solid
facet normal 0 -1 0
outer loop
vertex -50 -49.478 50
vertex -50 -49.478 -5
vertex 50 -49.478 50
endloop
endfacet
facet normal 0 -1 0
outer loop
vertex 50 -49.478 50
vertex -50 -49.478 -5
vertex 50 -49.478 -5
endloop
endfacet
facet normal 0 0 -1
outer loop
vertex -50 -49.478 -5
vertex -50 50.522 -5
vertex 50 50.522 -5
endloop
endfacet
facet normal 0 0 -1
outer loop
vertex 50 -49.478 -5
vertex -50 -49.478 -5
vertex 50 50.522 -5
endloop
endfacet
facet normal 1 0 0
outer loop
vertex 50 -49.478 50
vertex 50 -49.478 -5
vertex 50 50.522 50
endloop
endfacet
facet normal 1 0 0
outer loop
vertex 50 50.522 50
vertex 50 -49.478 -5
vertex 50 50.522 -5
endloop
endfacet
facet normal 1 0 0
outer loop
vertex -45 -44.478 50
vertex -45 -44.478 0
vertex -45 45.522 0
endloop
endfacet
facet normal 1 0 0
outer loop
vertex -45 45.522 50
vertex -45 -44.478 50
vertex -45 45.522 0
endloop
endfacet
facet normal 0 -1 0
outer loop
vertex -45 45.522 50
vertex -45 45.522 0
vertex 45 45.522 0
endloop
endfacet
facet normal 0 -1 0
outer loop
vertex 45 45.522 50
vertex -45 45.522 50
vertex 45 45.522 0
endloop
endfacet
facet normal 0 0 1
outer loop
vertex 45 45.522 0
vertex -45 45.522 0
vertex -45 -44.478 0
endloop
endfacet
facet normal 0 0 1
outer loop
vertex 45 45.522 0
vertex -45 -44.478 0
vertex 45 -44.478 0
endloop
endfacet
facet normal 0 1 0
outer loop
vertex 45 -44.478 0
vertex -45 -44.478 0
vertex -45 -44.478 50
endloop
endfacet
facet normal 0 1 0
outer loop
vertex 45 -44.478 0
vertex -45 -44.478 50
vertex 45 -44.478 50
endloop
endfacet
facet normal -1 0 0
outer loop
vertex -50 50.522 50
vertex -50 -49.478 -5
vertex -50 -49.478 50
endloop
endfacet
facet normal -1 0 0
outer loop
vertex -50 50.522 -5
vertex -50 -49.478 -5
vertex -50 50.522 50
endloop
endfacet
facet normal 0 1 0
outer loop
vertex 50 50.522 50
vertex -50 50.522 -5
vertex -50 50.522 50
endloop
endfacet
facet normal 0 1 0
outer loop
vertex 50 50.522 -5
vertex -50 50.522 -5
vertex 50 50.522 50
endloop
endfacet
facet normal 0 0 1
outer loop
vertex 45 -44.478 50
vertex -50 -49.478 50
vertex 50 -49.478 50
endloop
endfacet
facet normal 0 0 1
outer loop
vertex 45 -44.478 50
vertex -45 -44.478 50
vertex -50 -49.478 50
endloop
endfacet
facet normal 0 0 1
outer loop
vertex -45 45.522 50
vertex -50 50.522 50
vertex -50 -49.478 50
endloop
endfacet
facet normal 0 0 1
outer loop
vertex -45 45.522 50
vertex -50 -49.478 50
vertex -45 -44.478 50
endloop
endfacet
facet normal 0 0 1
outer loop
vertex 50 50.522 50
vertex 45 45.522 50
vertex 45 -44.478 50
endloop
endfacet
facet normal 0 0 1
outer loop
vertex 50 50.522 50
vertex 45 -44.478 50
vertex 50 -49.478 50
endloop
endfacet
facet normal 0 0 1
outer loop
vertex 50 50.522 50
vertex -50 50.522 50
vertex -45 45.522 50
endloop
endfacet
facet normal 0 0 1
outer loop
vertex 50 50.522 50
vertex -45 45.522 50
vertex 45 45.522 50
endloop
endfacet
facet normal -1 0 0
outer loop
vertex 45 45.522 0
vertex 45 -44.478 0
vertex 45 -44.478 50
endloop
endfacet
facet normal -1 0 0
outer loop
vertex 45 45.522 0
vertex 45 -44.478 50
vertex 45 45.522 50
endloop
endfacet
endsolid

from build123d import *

# Parameters (mm, degrees)
F0_W     = 100
F0_H     = 100
F1_DEPTH = 5
F2_W     = 100
F2_H     = 100
F2_W_2   = 90
F2_H_2   = 90
F3_DEPTH = 50


with BuildPart() as f1:
    # F0 (on Top) → F1 (new body)
    with BuildSketch(Plane.XY):
        with Locations((0, 0.521898)):
            Rectangle(F0_W, F0_H)
    extrude(amount=-F1_DEPTH)

    # F2 (on face) → F3 (join)
    with BuildSketch(Plane.XY):
        with Locations((0, 0.521898)):
            Rectangle(F2_W, F2_H)
        with Locations((0, 0.521898)):
            Rectangle(F2_W_2, F2_H_2, mode=Mode.SUBTRACT)
    extrude(amount=F3_DEPTH)


solid = f1.part
